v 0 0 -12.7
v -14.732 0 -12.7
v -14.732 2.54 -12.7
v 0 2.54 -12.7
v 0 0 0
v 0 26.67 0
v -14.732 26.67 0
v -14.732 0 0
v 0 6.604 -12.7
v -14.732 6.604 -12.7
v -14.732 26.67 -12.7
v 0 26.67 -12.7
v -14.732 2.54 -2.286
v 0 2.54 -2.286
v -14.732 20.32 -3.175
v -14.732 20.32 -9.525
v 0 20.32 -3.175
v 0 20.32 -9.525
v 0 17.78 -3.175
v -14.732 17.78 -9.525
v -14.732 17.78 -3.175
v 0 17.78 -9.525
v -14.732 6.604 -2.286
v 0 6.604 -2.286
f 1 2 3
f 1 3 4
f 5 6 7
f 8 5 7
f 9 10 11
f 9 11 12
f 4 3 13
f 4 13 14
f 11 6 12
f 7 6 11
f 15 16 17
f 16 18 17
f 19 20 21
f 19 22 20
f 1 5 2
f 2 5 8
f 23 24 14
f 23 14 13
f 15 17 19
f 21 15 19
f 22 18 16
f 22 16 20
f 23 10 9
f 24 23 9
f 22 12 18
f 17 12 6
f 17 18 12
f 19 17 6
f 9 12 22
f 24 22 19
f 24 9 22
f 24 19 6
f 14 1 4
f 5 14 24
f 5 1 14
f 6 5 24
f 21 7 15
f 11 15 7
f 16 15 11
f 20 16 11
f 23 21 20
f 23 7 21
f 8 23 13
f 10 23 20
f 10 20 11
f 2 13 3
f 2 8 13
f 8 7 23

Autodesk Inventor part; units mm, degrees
ref_plane "YZ Plane" through (0, 0, 0) normal (1, 0, 0) x (0, 1, 0)
ref_plane "XZ Plane" through (0, 0, 0) normal (0, 1, 0) x (-1, 0, 0)
ref_plane "XY Plane" through (0, 0, 0) normal (0, 0, 1) x (1, 0, 0)
sketch "Sketch1" plane through (0, 0, 0) normal (0, 1, 0) x (-1, 0, 0)
  line L0 (0, 0) -> (14.732, 0)
  line L1 (14.732, 0) -> (14.732, -12.7)
  line L2 (14.732, -12.7) -> (0, -12.7)
  line L3 (0, -12.7) -> (0, 0)
  dimension "d0" = 12.7
  dimension "d1" = 14.732
extrude "Extrusion1" add sketch "Sketch1" along normal blind 26.67
sketch "Sketch2" plane through (0, 0, -12.7) normal (0, 0, -1) x (-1, 0, 0)
  line L0 (0, 0) -> (14.732, 0) projected
  line L1 (14.732, 0) -> (14.732, 2.54)
  line L2 (14.732, 0) -> (14.732, 26.67) projected
  line L3 (14.732, 2.54) -> (14.732, 6.604)
  line L4 (14.732, 6.604) -> (0, 6.604)
  line L5 (0, 0) -> (0, 26.67) projected
  line L6 (14.732, 2.54) -> (0, 2.54)
  line L7 (0, 2.54) -> (0, 6.604)
  line L8 (0, 6.604) -> (14.732, 6.604)
  line L9 (14.732, 6.604) -> (14.732, 2.54)
  dimension "d4" = 2.54
  dimension "d5" = 4.064
extrude "Extrusion2" cut sketch "Sketch2" against normal blind 10.414 contours L5 L4 L2 L6
sketch "Sketch3" plane through (0, 0, 0) normal (1, 0, 0) x (0, 0, -1)
  line L0 (0, 26.67) -> (12.7, 26.67) projected
  line L1 (0, 26.67) -> (6.35, 26.67)
  line L2 (6.35, 26.67) -> (6.35, 20.32)
  line L3 (6.35, 20.32) -> (3.175, 20.32)
  line L4 (3.175, 20.32) -> (3.175, 17.78)
  line L5 (3.175, 20.32) -> (9.525, 20.32)
  line L6 (9.525, 20.32) -> (9.525, 17.78)
  line L7 (9.525, 17.78) -> (3.175, 17.78)
  line L8 (3.175, 17.78) -> (3.175, 20.32)
  point P0 (0, 0)
  dimension "d8" = 6.35
  dimension "d9" = 6.35
  dimension "d10" = 3.175
  dimension "d11" = 2.54
  dimension "d12" = 6.35
extrude "Extrusion3" cut sketch "Sketch3" against normal blind 15.1765
properties part number "drone_battery_holder"
